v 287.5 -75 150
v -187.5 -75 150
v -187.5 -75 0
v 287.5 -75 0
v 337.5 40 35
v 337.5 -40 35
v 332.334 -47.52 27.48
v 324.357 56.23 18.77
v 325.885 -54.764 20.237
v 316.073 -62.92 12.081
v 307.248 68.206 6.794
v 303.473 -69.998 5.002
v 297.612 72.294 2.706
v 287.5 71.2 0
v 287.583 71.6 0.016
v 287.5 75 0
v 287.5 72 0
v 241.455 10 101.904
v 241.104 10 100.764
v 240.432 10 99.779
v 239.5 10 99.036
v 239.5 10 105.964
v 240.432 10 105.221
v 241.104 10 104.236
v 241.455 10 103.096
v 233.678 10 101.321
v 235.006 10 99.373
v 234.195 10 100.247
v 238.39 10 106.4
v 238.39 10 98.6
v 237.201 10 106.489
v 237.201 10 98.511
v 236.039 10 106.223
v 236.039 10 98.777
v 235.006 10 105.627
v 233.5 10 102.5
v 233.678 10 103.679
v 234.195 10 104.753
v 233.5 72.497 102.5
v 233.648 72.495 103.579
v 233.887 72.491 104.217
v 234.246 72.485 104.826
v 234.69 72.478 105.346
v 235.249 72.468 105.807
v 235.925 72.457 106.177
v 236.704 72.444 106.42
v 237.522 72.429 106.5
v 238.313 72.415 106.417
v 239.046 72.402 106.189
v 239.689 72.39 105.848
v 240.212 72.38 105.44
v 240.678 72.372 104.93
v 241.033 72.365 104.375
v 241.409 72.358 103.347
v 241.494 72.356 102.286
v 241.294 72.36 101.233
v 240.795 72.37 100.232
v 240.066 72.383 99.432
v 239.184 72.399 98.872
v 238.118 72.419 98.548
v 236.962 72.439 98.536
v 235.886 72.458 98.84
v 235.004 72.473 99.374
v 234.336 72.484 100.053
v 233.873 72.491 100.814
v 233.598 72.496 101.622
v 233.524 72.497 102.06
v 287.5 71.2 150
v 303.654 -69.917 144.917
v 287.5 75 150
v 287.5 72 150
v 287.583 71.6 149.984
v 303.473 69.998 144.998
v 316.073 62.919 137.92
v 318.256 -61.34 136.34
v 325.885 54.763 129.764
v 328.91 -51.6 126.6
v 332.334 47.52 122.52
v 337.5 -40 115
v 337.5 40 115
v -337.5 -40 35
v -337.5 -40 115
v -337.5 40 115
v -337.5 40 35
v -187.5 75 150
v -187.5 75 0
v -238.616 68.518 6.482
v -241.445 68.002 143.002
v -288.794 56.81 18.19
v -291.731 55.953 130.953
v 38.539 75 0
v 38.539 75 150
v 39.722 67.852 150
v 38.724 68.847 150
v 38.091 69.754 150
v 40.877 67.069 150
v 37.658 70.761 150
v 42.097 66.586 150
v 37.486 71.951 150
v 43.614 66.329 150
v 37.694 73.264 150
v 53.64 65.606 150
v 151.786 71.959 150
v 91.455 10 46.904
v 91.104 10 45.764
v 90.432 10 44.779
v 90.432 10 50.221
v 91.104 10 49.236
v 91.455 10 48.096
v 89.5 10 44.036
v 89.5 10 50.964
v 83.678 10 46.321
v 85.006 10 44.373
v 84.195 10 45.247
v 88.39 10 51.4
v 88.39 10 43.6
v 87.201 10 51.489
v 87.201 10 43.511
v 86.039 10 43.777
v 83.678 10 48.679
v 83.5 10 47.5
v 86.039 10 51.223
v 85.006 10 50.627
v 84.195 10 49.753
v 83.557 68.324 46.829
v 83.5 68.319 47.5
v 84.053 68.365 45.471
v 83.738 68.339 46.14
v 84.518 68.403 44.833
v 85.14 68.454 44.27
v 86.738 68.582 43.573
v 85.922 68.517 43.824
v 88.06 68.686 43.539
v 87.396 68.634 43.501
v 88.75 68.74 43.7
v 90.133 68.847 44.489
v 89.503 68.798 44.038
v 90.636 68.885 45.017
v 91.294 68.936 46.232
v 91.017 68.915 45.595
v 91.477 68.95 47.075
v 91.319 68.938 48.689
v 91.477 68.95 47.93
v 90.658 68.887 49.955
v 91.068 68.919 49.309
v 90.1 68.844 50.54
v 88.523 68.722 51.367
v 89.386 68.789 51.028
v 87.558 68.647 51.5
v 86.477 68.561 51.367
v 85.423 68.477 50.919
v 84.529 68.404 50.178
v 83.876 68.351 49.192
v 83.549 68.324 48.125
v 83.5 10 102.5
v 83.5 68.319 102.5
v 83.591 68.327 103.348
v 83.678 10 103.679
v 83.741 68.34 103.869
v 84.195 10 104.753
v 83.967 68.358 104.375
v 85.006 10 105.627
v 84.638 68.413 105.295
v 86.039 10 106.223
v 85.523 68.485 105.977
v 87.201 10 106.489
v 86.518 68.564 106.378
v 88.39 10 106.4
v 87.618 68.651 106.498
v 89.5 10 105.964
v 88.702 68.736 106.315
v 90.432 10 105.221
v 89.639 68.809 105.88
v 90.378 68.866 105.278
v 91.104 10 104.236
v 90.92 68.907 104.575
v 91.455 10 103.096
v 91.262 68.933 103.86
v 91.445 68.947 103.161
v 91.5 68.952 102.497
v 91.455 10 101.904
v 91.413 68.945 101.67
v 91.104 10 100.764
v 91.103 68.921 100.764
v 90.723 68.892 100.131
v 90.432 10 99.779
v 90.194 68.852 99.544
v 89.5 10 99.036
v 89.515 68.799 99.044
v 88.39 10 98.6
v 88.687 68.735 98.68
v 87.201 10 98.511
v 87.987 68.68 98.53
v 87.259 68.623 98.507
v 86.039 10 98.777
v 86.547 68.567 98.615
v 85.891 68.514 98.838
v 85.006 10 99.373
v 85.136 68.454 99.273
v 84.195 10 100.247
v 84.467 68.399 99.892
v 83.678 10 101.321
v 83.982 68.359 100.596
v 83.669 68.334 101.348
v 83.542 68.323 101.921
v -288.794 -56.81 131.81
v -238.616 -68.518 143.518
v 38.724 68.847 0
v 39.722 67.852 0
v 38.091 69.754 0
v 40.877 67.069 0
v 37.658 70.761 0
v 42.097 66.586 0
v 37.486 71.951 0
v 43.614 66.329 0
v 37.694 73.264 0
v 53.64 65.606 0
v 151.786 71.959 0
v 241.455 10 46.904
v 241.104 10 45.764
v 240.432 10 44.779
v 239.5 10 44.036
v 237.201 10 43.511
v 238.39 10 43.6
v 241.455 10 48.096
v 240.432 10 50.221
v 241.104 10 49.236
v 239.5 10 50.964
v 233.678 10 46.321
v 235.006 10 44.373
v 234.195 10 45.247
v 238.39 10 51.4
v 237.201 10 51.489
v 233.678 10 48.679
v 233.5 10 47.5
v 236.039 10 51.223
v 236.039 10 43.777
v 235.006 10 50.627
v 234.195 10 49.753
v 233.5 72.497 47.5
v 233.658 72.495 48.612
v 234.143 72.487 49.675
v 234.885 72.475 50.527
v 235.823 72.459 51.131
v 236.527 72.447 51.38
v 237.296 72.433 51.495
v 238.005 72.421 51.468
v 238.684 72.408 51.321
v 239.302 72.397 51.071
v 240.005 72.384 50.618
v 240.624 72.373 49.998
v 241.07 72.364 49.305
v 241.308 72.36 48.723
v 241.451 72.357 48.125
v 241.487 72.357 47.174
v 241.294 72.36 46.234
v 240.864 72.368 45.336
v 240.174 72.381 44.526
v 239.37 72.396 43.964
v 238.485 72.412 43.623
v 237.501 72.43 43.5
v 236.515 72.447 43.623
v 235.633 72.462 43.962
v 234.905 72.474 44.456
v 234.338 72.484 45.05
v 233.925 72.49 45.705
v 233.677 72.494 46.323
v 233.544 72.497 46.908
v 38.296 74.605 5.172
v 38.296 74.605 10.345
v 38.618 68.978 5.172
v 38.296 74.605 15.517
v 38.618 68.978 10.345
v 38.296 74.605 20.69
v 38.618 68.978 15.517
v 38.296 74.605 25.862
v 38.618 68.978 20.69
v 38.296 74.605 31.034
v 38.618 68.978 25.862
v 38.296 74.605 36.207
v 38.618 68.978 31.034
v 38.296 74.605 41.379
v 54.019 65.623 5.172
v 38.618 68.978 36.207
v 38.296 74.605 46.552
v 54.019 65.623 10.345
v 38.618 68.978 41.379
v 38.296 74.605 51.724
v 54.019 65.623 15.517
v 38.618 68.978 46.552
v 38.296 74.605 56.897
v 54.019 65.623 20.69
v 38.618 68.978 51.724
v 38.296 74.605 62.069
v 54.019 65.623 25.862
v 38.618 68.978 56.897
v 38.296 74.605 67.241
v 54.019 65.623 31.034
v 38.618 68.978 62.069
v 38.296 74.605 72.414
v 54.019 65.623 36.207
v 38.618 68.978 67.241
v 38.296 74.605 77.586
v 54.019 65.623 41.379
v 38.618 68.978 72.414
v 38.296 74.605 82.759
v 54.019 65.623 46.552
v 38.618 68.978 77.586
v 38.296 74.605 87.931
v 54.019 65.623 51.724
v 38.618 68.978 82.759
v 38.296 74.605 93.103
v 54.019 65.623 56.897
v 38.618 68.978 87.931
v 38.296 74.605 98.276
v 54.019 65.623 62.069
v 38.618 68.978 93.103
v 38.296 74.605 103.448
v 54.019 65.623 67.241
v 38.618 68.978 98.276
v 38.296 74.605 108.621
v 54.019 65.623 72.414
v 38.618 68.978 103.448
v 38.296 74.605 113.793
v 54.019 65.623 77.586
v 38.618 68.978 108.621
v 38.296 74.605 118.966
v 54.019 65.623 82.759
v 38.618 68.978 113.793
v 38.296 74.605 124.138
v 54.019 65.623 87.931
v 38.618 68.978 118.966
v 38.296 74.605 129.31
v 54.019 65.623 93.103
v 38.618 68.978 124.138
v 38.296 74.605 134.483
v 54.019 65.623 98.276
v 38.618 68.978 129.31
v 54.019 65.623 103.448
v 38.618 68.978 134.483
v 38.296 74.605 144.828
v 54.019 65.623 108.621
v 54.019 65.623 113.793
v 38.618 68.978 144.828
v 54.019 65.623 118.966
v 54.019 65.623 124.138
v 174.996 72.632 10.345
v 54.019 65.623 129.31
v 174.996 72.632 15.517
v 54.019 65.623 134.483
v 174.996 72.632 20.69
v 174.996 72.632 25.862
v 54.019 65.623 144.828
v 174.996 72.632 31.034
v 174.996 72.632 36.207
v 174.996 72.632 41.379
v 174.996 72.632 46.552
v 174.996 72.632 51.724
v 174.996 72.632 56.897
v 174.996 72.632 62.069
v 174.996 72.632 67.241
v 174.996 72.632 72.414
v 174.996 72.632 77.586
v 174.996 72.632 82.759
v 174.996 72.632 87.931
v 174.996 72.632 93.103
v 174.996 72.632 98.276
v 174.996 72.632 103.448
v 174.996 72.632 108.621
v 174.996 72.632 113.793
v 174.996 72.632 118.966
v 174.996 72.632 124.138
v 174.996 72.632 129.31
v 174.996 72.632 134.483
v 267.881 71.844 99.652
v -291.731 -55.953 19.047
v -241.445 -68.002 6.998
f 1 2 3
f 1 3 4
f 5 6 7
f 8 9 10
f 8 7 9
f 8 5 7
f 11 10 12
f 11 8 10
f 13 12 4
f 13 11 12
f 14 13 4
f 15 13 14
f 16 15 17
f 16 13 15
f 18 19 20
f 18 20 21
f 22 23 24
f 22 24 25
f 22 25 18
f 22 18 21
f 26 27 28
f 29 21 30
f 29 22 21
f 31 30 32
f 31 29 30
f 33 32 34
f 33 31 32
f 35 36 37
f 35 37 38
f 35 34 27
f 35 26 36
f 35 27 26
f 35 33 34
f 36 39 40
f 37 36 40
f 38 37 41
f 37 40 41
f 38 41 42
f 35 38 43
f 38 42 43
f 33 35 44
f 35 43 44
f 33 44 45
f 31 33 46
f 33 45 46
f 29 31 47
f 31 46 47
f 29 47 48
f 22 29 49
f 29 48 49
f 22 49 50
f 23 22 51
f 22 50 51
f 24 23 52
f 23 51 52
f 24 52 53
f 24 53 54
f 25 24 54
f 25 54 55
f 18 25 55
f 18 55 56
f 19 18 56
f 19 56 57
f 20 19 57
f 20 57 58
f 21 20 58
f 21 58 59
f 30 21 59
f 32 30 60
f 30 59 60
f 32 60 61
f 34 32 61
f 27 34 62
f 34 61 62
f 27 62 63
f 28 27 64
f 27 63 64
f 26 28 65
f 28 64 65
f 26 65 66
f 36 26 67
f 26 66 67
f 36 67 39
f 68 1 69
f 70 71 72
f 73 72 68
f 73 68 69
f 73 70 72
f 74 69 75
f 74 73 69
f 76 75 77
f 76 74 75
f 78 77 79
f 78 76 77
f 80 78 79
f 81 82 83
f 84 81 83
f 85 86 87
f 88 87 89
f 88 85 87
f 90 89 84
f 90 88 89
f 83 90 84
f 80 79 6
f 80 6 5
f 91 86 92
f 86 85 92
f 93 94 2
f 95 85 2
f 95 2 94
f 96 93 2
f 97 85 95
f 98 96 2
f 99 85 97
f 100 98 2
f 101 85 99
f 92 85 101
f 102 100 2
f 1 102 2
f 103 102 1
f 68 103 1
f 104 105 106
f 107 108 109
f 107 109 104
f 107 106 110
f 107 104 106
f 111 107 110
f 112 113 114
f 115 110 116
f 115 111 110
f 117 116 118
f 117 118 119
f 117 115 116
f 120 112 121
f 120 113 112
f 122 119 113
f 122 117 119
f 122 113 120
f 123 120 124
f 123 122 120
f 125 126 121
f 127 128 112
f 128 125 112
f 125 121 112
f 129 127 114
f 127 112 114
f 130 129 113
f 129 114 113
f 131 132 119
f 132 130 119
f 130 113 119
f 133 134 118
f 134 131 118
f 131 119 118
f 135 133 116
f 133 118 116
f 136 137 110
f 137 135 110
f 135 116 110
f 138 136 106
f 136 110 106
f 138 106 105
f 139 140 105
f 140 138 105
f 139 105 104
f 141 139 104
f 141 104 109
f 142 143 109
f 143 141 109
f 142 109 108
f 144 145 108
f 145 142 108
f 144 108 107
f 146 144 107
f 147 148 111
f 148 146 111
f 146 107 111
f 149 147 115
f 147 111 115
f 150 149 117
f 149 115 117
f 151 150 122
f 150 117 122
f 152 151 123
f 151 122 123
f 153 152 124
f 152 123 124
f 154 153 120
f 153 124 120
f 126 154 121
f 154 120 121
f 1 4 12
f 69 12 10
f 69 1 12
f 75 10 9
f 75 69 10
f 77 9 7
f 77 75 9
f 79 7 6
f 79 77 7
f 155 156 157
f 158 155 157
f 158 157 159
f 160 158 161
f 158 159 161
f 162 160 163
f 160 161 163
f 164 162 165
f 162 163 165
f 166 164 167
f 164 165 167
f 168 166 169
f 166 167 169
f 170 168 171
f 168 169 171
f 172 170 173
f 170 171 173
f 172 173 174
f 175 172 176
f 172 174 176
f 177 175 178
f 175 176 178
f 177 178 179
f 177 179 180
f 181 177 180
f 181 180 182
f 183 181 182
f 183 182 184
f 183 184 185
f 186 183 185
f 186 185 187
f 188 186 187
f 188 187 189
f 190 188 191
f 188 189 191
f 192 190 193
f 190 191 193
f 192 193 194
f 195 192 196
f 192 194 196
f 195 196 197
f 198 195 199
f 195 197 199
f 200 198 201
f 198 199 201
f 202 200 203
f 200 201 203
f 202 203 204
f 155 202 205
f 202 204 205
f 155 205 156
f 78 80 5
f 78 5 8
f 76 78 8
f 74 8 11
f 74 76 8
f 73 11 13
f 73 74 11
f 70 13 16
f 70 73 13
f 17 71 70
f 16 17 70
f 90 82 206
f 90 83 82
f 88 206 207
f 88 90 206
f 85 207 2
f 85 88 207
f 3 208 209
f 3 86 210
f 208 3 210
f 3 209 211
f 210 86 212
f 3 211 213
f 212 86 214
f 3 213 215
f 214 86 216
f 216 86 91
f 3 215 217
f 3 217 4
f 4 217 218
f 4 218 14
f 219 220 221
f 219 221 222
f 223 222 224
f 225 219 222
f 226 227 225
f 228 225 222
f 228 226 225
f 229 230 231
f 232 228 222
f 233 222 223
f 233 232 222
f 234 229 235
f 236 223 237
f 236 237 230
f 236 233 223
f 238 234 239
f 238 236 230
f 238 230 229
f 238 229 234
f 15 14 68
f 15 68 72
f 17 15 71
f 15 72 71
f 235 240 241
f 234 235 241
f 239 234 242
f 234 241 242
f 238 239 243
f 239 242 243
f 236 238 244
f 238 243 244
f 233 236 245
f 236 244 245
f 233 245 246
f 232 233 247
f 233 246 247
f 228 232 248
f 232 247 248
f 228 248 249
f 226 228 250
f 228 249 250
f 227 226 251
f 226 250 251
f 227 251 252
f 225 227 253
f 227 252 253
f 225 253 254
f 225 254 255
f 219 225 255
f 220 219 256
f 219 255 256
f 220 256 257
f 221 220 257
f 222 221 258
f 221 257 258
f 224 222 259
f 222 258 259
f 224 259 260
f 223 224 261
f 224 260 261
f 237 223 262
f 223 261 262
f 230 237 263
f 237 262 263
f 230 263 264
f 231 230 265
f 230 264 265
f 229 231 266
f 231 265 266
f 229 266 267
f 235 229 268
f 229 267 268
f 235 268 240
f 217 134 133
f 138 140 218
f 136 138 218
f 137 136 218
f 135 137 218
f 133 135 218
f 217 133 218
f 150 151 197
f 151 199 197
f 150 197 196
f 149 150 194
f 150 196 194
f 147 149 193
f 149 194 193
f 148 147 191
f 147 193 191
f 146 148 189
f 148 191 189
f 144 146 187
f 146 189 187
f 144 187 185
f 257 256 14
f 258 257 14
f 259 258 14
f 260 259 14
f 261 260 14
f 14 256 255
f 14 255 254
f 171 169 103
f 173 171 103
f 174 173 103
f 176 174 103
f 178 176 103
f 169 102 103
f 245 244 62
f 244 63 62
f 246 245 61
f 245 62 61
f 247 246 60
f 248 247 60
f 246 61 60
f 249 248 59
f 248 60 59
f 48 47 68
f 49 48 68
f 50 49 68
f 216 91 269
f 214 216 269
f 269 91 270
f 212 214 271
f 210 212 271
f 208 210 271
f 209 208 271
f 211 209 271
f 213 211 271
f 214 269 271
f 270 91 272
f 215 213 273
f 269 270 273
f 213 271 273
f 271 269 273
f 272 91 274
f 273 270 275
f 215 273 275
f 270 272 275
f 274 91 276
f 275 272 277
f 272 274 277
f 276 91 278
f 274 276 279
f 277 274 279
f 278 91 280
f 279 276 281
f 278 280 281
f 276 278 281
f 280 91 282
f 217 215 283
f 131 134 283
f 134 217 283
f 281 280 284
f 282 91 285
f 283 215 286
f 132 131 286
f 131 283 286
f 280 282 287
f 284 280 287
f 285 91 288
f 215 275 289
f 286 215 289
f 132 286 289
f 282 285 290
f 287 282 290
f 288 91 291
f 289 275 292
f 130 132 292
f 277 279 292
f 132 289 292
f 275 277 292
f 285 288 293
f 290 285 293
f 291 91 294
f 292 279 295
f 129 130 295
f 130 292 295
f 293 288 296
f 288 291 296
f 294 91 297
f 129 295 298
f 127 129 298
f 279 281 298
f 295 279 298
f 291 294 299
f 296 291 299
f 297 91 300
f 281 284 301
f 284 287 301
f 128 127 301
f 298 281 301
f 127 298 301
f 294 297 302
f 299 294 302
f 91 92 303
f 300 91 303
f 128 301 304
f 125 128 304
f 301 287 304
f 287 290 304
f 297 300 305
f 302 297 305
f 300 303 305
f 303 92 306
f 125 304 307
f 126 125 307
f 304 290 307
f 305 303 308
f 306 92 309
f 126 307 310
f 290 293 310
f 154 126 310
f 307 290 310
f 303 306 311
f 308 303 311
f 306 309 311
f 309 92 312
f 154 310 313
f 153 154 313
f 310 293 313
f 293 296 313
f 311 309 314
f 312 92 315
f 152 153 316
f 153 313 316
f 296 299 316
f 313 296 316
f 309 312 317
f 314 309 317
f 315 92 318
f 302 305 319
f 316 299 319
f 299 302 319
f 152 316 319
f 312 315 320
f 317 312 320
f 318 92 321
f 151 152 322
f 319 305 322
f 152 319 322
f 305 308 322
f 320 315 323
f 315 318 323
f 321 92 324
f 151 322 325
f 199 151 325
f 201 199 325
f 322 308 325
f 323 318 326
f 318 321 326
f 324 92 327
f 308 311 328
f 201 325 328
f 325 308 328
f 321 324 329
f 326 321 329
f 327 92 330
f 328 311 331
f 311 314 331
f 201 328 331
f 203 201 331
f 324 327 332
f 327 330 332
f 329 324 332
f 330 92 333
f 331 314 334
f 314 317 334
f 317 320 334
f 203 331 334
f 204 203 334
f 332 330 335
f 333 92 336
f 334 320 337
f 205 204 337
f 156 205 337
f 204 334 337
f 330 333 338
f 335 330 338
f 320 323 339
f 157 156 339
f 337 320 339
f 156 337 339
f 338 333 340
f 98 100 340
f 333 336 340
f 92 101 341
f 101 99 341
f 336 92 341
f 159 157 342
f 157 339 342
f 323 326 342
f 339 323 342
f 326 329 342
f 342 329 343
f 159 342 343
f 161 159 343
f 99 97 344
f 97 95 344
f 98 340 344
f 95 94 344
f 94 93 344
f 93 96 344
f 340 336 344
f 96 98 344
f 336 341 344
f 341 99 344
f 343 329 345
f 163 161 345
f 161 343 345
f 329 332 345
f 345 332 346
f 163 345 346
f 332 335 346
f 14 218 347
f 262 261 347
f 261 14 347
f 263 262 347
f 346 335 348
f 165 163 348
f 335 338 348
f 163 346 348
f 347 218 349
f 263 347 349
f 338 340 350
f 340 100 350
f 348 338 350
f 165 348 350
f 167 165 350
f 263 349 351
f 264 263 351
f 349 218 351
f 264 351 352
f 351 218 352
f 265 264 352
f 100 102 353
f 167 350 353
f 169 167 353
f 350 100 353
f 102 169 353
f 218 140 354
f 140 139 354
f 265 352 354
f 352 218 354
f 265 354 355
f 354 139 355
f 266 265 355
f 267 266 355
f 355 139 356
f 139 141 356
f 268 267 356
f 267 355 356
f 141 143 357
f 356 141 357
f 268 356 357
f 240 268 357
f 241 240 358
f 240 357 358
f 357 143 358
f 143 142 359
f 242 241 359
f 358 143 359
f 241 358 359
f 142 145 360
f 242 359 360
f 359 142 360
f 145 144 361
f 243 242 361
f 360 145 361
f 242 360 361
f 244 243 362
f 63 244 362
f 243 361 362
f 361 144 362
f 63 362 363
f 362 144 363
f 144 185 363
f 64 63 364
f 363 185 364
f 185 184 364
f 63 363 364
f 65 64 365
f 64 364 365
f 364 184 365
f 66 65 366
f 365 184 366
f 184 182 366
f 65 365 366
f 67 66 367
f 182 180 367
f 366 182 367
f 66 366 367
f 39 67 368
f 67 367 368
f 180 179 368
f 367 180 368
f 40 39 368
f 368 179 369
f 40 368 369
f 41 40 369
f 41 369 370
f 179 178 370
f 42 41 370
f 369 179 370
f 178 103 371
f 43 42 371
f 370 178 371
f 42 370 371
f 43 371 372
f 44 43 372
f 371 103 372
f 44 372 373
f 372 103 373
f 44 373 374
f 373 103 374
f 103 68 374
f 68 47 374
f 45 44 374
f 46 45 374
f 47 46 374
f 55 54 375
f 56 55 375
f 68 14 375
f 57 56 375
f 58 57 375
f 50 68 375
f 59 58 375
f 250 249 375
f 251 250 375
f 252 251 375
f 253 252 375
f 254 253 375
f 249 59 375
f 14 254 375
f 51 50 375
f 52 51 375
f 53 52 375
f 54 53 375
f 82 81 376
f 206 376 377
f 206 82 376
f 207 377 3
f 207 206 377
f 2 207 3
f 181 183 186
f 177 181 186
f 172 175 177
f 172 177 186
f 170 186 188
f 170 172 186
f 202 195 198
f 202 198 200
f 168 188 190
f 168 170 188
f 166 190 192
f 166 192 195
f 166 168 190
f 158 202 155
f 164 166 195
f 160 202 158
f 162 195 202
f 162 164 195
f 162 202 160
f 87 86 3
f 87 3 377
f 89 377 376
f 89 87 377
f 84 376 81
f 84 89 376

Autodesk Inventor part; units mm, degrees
ref_plane "YZ Plane" through (0, 0, 0) normal (1, 0, 0) x (0, 1, 0)
ref_plane "XY Plane" through (0, 0, 0) normal (0, 0, 1) x (1, 0, 0)
sketch "Sketch1" plane through (0, 0, 0) normal (0, 0, 1) x (1, 0, 0)
  line L0 (-337.5, 75) -> (337.5, 75)
  line L1 (337.5, 75) -> (337.5, -75)
  line L2 (337.5, -75) -> (-337.5, -75)
  line L3 (-337.5, -75) -> (-337.5, 75)
  line L4 (-337.5, 75) -> (337.5, -75) construction
  line L5 (337.5, 75) -> (-337.5, -75) construction
  point P0 (0, 0)
  dimension "d0" = 675
  dimension "d1" = 150
extrude "Extrusion1" add sketch "Sketch1" along normal blind 150
sketch "Sketch2" plane through (0, 0, 150) normal (0, 0, 1) x (1, 0, 0)
  line L0 (-400, 225) -> (400, 225)
  line L1 (400, 225) -> (400, -225)
  line L2 (400, -225) -> (-400, -225)
  line L3 (-400, -225) -> (-400, 225)
  line L4 (-337.5, 0) -> (-187.5, 0)
  line L5 (-337.5, 0) -> (-337.5, 40)
  line L6 (-337.5, 0) -> (-337.5, -40)
  line L7 (337.5, 0) -> (287.5, 0)
  line L8 (337.5, 0) -> (337.5, 40)
  line L9 (337.5, 0) -> (337.5, -40)
  arc A0 (-187.5, 75) -> (-337.5, 40) centre (-150.241, -423.6098) ccw
  line L10 (-187.5, 75) -> (287.5, 75)
  arc A1 (337.5, 40) -> (287.5, 75) centre (273.2116, 1.3736) ccw
  arc A2 (-337.5, -40) -> (-187.5, -75) centre (-150.241, 423.6098) ccw
  line L11 (-187.5, -75) -> (287.5, -75)
  arc A3 (287.5, -75) -> (337.5, -40) centre (273.2116, -1.3736) ccw
  point P0 (0, 0)
  dimension "d4" = 800
  dimension "d5" = 450
  dimension "d14" = 50
  dimension "d15" = 40
  dimension "d16" = 40
  dimension "d17" = 500
  dimension "d18" = 75
extrude "Extrusion2" cut sketch "Sketch2" against normal blind 150
sketch "Sketch3" plane through (-187.5, 75, 0) normal (0, 1, 0) x (1, 0, 0)
  line L0 (-312.5, 400) -> (687.5, 400)
  line L1 (687.5, 400) -> (687.5, -400)
  line L2 (687.5, -400) -> (-312.5, -400)
  line L3 (-312.5, -400) -> (-312.5, 400)
  line L4 (525, 0) -> (525, -150) projected
  line L5 (525, -75) -> (475, -75)
  line L6 (-150, -150) -> (-150, 0) projected
  line L7 (-150, -75) -> (-150, -35)
  line L8 (0, 0) -> (475, 0) projected
  arc A0 (0, 0) -> (-150, -35) centre (37.259, -498.6098) ccw
  line L9 (525, -75) -> (525, -35)
  line L10 (525, 0) -> (475, 0) projected
  arc A1 (525, -35) -> (475, 0) centre (460.7116, -73.6264) ccw
  line L11 (-150, -75) -> (-150, -115)
  arc A2 (-150, -115) -> (0, -150) centre (37.259, 348.6098) ccw
  line L12 (525, -75) -> (525, -115)
  arc A3 (475, -150) -> (525, -115) centre (460.7116, -76.3736) ccw
  line L13 (475, -150) -> (0, -150) projected
  line L14 (0, -150) -> (475, -150)
  point P0 (187.5, 0)
  dimension "d23" = 40
  dimension "d24" = 500
  dimension "d25" = 40
  dimension "d26" = 75
extrude "Extrusion3" cut sketch "Sketch3" against normal blind 150 contours L0 L1 L2 L3 | L4 A1 L10
sketch "Sketch4" plane through (0, 0, 150) normal (0, 0, 1) x (1, 0, 0)
  spline S0 degree 4 poles (287.5, 72) (275.7106, 75.6696) (272.2633, 78.0977) (241.0041, 87.3899) (212.1922, 94.1056) (186.8012, 99.4436) (162.2405, 102.6617) (136.499, 103.3609) (115.3024, 103.9082) (87.5125, 99.0497) (77.8593, 96.7101) (62.5936, 91.6603) (56.4872, 88.8369) (50.2371, 85.9481) (43.0983, 79.8721) (41.263, 78.3038) (35.0709, 71.8313) (41.0621, 66.1136) (43.5349, 66.5804) (51.0426, 65.1949) (57.2037, 65.9223) (63.437, 66.335) (78.7454, 67.9836) (88.3716, 68.7088) (116.236, 70.8678) (137.1854, 71.569) (162.8258, 72.2403) (187.1936, 73.1117) (212.5281, 72.7462) (241.0177, 72.4966) (272.1667, 71.6209) (275.8592, 71.8531) (287.5, 71.2) knots 0 0 0 0 0 0.082908 0.121264 0.162409 0.203325 0.244067 0.284728 0.322462 0.357388 0.387441 0.412707 0.436373 0.45684 0.477222 0.496964 0.514702 0.533384 0.551956 0.570848 0.593257 0.617753 0.647324 0.681959 0.719554 0.76011 0.800663 0.841217 0.881776 0.91937 1 1 1 1 1
  arc A0 (287.5, 71.2) -> (287.5, 72) centre (286.5835, 71.6) ccw
  point P0 (0, 0)
  point P1 (274.89, 76.355)
  point P2 (262.2875, 80.71)
  point P3 (237.1175, 87.97)
  point P4 (211.975, 94.0325)
  point P5 (186.8575, 99.02)
  point P6 (161.785, 102.1575)
  point P7 (136.7575, 103.3225)
  point P8 (111.775, 102.5875)
  point P9 (86.8675, 98.68)
  point P10 (74.4425, 95.465)
  point P11 (62.0425, 91.2)
  point P12 (55.855, 88.53)
  point P13 (49.685, 85.06)
  point P14 (43.5475, 80.2425)
  point P15 (40.49, 77.395)
  point P16 (37.5, 71.6)
  point P17 (40.73, 67.15)
  point P18 (43.875, 66.3)
  point P19 (50.14, 65.645)
  point P20 (56.385, 65.7925)
  point P21 (62.6225, 66.3375)
  point P22 (75.095, 67.555)
  point P23 (87.57, 68.6475)
  point P24 (112.5275, 70.43)
  point P25 (137.5025, 71.54)
  point P26 (162.485, 72.275)
  point P27 (187.47, 72.86)
  point P28 (212.4725, 72.77)
  point P29 (237.48, 72.43)
  point P30 (262.4925, 71.94)
  point P31 (274.9975, 71.7075)
  point P32 (287.5, 75)
  dimension "d31" = 1
extrude "Extrusion4" cut sketch "Sketch4" against normal blind 150
sketch "Sketch5" plane through (0, 0, 150) normal (0, 0, 1) x (1, 0, 0)
  spline S0 degree 4 poles (278.5919, 75) (280.4602, 74.3245) (282.4435, 73.6259) (284.707, 72.8694) (287.5, 72) knots 0 0 0 0 0 1 1 1 1 1 projected
  line L0 (287.5, 72) -> (287.5, 75) projected
  line L1 (287.5, 75) -> (278.5919, 75) projected
  point P0 (0, 0)
extrude "Extrusion5" cut sketch "Sketch5" against normal blind 150
sketch "Sketch8" plane through (0, 0, 150) normal (0, 0, 1) x (1, 0, 0)
  line L0 (38.5386, 75) -> (-187.5, 75) projected
  line L1 (-187.5, 75) -> (-187.5, -75) projected
  line L2 (-187.5, -75) -> (287.5, -75) projected
  line L3 (287.5, -75) -> (287.5, 71.2) projected
  arc A0 (-337.5, -40) -> (-187.5, -75) centre (-150.241, 423.6098) ccw projected
  line L4 (-187.5, 75) -> (-187.5, -75) projected
  arc A1 (-187.5, 75) -> (-337.5, 40) centre (-150.241, -423.6098) ccw projected
  line L5 (-337.5, -40) -> (-337.5, 40) projected
  line L6 (287.5, -75) -> (287.5, 71.2) projected
  arc A2 (287.5, -75) -> (337.5, -40) centre (273.2116, -1.3736) ccw projected
  line L7 (337.5, 40) -> (337.5, -40) projected
  arc A3 (337.5, 40) -> (287.5, 75) centre (273.2116, 1.3736) ccw projected
  line L8 (287.5, 72) -> (287.5, 75) projected
  point P0 (0, 0)
sketch "Sketch9" plane through (-187.5, 75, 150) normal (0, 1, 0) x (1, 0, 0)
  point P0 (187.5, 150)
sketch "Sketch10" plane through (-337.5, -40, 115) normal (-1, 0, 0) x (0, 0, 1)
  line L0 (0, 0) -> (0, 80) projected
  line L1 (0, 80) -> (-80, 80) projected
  line L2 (-80, 80) -> (-80, 0) projected
  line L3 (-80, 0) -> (0, 0) projected
  point P0 (-115, 40)
ref_plane "Work Plane1" through (0, 60, 0) normal (0, 1, 0) x (-1, 0, 0)
sketch "Sketch11" plane through (0, 60, 0) normal (0, 1, 0) x (-1, 0, 0)
  line L0 (-287.5, 0) -> (-287.5, 150) projected
  line L1 (-287.5, 75) -> (-287.5, 47.5)
  line L2 (-287.5, 47.5) -> (-237.5, 47.5)
  circle A0 centre (-237.5, 47.5) radius 4
  line L3 (-287.5, 75) -> (-187.5, 75)
  line L4 (-287.5, 47.5) -> (-87.5, 47.5)
  circle A1 centre (-87.5, 47.5) radius 4
  circle A2 centre (-237.5, 102.5) radius 4
  circle A3 centre (-87.5, 102.5) radius 4
  point P0 (0, 0)
  dimension "d70" = 27.5
  dimension "d71" = 50
  dimension "d72" = 8
  dimension "d73" = 100
  dimension "d74" = 200
  dimension "d75" = 8
extrude "Extrusion8" cut sketch "Sketch11" against normal mid plane 100
